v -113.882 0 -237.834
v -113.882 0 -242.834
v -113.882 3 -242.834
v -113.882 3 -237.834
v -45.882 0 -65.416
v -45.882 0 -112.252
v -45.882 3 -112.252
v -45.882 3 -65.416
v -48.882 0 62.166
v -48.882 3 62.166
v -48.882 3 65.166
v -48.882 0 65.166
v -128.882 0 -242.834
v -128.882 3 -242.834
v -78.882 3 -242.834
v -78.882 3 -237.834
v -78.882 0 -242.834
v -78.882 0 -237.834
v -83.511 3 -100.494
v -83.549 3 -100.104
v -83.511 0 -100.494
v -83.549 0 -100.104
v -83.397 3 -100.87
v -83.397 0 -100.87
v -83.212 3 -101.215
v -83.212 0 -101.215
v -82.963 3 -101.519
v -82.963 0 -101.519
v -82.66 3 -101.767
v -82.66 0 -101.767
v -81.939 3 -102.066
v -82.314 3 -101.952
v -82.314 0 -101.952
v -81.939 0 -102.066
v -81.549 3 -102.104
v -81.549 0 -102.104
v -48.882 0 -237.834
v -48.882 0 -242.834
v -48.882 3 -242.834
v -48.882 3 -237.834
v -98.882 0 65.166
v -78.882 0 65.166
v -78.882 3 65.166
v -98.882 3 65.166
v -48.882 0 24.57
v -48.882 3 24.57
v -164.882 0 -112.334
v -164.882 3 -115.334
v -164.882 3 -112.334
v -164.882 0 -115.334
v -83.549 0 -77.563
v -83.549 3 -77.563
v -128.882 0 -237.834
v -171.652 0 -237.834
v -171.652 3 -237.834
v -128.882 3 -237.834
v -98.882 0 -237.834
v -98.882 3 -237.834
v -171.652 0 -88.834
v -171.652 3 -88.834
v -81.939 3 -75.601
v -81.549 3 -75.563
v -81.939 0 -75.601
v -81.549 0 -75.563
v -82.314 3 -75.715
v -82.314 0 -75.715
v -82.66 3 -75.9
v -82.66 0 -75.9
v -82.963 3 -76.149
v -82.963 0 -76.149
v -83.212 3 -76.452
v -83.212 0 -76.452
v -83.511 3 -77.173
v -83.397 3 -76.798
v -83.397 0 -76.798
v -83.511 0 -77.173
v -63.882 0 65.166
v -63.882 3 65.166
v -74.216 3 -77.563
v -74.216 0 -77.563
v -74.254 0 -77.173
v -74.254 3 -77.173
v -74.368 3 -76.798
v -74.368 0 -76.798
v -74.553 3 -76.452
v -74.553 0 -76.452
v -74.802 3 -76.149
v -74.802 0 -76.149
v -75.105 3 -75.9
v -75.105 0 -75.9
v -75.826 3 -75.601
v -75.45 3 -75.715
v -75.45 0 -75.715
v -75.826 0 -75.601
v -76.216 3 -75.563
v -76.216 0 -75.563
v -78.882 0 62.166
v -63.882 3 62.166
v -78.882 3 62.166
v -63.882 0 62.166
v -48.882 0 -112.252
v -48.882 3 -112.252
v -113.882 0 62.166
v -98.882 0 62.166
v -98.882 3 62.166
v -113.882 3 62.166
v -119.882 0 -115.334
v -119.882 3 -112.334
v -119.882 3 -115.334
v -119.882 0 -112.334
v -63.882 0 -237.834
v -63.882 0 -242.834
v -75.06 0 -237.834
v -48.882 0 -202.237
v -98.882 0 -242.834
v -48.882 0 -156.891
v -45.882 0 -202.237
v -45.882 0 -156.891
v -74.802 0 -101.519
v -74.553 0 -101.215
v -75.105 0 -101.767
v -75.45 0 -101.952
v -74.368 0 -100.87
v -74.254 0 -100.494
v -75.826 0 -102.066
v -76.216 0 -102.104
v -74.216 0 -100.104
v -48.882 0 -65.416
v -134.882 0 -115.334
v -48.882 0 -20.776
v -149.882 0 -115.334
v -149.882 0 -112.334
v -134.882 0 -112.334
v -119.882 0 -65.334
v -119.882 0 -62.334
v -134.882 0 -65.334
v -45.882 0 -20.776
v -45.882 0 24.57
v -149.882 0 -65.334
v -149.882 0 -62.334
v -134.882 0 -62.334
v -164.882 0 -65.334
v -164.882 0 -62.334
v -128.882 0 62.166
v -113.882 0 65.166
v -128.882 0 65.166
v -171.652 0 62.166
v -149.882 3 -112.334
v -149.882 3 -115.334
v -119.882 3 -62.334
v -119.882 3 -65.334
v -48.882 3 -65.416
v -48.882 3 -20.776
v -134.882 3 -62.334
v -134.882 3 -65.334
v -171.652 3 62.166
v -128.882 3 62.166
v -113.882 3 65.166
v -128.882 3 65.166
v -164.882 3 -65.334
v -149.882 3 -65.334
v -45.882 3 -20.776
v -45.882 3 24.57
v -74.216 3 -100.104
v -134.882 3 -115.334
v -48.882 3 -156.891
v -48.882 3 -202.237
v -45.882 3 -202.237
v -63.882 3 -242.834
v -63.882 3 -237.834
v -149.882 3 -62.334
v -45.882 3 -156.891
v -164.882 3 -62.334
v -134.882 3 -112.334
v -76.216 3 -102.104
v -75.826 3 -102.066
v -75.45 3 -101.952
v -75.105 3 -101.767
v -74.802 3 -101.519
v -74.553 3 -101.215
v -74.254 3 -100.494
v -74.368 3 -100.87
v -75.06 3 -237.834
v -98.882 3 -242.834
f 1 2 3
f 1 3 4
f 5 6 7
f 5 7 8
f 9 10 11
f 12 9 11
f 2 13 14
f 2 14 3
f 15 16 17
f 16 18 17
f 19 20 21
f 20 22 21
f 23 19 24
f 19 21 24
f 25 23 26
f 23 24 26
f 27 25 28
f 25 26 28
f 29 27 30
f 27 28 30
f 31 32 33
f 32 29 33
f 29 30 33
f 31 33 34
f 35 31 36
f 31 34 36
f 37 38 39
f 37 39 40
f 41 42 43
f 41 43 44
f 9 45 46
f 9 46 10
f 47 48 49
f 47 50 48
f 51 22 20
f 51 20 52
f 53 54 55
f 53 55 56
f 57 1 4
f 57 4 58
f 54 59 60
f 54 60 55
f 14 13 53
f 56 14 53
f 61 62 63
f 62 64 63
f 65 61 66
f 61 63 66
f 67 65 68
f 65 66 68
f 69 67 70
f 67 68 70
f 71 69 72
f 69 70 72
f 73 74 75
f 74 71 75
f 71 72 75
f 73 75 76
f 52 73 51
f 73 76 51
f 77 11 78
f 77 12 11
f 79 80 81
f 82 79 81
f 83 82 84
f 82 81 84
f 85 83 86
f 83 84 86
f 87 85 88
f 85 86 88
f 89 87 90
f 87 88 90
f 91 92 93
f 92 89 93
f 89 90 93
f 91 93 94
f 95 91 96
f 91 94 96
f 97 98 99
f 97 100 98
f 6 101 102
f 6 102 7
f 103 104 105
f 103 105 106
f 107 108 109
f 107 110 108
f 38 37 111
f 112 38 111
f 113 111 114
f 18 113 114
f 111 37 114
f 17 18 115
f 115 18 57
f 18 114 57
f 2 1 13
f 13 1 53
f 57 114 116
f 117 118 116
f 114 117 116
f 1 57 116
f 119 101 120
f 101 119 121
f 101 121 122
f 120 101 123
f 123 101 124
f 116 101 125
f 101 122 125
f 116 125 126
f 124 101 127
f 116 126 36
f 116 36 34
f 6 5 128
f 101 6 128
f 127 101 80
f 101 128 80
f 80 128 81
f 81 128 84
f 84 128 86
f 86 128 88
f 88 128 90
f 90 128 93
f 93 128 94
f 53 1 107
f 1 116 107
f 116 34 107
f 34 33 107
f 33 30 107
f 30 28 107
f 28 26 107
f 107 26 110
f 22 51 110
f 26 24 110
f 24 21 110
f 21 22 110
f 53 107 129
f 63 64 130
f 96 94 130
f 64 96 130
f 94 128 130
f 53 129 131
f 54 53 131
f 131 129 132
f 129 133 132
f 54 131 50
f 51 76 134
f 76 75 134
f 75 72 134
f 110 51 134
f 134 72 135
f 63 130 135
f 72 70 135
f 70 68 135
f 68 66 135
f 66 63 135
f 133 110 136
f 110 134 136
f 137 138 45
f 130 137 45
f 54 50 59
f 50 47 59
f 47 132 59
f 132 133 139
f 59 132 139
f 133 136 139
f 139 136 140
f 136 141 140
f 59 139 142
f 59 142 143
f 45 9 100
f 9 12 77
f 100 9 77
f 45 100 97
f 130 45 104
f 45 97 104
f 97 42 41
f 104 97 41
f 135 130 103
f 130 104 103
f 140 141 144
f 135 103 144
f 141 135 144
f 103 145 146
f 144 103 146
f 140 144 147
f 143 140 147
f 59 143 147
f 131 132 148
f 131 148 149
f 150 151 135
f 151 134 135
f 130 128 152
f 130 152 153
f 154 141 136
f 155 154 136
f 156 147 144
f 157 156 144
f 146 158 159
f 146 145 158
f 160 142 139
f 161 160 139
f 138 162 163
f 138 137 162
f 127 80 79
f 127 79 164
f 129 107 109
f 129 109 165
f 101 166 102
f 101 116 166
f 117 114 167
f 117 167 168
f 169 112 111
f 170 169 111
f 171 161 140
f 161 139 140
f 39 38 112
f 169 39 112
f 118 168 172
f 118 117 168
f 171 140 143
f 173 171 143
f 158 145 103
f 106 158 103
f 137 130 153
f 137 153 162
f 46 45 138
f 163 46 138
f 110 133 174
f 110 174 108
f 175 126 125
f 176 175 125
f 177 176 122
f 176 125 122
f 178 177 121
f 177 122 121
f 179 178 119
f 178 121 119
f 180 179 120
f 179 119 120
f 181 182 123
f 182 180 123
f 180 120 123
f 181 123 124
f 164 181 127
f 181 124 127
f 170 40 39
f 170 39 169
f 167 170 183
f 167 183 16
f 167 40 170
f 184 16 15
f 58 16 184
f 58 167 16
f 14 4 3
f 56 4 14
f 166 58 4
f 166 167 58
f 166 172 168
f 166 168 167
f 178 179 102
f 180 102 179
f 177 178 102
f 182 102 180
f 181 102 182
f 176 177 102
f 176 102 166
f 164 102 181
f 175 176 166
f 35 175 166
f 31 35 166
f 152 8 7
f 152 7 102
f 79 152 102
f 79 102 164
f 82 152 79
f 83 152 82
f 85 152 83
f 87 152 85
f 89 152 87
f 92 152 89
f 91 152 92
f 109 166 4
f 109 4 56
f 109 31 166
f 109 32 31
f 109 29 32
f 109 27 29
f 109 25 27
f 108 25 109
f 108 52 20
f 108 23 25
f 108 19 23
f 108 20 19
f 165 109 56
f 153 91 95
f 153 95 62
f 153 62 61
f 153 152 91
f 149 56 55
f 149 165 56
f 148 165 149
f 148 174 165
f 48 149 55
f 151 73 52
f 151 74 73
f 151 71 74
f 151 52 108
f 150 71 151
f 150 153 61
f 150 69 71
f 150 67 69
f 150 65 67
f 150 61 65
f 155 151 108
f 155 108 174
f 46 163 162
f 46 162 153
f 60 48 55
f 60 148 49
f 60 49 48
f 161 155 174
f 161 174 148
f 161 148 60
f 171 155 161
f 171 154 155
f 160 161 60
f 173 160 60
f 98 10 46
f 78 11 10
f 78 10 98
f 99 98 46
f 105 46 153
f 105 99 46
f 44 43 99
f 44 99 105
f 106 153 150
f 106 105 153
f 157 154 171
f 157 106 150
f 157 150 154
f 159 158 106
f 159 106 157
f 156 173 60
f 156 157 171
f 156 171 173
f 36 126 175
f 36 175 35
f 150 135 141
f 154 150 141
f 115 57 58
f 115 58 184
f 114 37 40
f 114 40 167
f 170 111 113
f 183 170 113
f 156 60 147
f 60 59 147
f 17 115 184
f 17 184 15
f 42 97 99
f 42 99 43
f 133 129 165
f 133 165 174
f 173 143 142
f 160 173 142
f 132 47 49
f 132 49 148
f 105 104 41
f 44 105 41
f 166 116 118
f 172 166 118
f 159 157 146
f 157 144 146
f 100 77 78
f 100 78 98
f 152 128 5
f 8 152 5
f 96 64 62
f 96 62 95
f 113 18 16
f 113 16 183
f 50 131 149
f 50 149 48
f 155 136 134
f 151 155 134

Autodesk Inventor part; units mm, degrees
ref_plane "YZ Plane" through (0, 0, 0) normal (1, 0, 0) x (0, 1, 0)
ref_plane "XZ Plane" through (0, 0, 0) normal (0, 1, 0) x (-1, 0, 0)
ref_plane "XY Plane" through (0, 0, 0) normal (0, 0, 1) x (1, 0, 0)
sketch "Sketch1" plane through (0, 0, 0) normal (0, 1, 0) x (-1, 0, 0)
  line L0 (98.8824, -242.8336) -> (78.8824, -242.8336)
  line L1 (98.8824, -237.8336) -> (98.8824, -242.8336)
  line L2 (113.8824, -237.8336) -> (98.8824, -237.8336)
  line L3 (128.8824, -242.8336) -> (113.8824, -242.8336)
  line L4 (128.8824, -242.8336) -> (128.8824, -237.8336)
  line L5 (113.8824, -242.8336) -> (113.8824, -237.8336)
  line L6 (113.8824, 65.1664) -> (113.8824, 62.1664)
  line L7 (98.8824, 62.1664) -> (98.8824, 65.1664)
  line L8 (78.8824, 65.1664) -> (98.8824, 65.1664)
  line L9 (98.8824, 62.1664) -> (113.8824, 62.1664)
  line L10 (113.8824, 65.1664) -> (128.8824, 65.1664)
  line L11 (128.8824, 62.1664) -> (128.8824, 65.1664)
  line L12 (78.8824, 62.1664) -> (78.8824, 65.1664)
  line L13 (63.8824, 62.1664) -> (78.8824, 62.1664)
  line L14 (63.8824, 65.1664) -> (63.8824, 62.1664)
  line L15 (63.8824, -242.8336) -> (63.8824, -237.8336)
  line L16 (63.8824, -237.8336) -> (75.0605, -237.8336)
  line L17 (78.8824, -237.8336) -> (78.8824, -242.8336)
  line L18 (78.8824, -237.8336) -> (63.8824, -237.8336)
  line L19 (63.8824, -237.8336) -> (78.8824, -237.8336)
  line L20 (48.8824, -65.4156) -> (48.8824, -20.7764)
  line L21 (48.8824, -65.4156) -> (48.8824, -20.7764)
  line L22 (48.8824, -65.4156) -> (45.8824, -65.4156)
  line L23 (45.8824, -112.2516) -> (45.8824, -65.4156)
  line L24 (48.8824, -20.7764) -> (45.8824, -20.7764)
  line L25 (48.8824, -202.2369) -> (45.8824, -202.2369)
  line L26 (48.8824, -156.8908) -> (45.8824, -156.8908)
  line L27 (45.8824, -202.2369) -> (45.8824, -156.8908)
  line L28 (48.8824, -112.2516) -> (45.8824, -112.2516)
  line L29 (48.8824, -156.8908) -> (48.8824, -112.2516)
  line L30 (48.8824, -156.8908) -> (48.8824, -112.2516)
  line L31 (45.8824, -20.7764) -> (45.8824, 24.5697)
  line L32 (48.8824, 24.5697) -> (45.8824, 24.5697)
  line L33 (48.8824, 24.5697) -> (48.8824, 62.1664)
  line L34 (48.8824, 65.1664) -> (63.8824, 65.1664)
  line L35 (48.8824, 24.5697) -> (48.8824, 65.1664)
  line L36 (48.8824, -237.8336) -> (48.8824, -202.2369)
  line L37 (48.8824, -242.8336) -> (63.8824, -242.8336)
  line L38 (48.8824, -242.8336) -> (48.8824, -237.8336)
  line L39 (164.8824, -115.3336) -> (164.8824, -112.3336)
  line L40 (164.8824, -112.3336) -> (149.8824, -112.3336)
  line L41 (149.8824, -112.3336) -> (149.8824, -115.3336)
  line L42 (134.8824, -115.3336) -> (134.8824, -112.3336)
  line L43 (134.8824, -112.3336) -> (119.8824, -112.3336)
  line L44 (119.8824, -112.3336) -> (119.8824, -115.3336)
  line L45 (119.8824, -115.3336) -> (134.8824, -115.3336)
  line L46 (149.8824, -115.3336) -> (164.8824, -115.3336)
  line L47 (171.6524, -88.8336) -> (171.6524, -237.8336)
  line L48 (171.6524, -237.8336) -> (128.8824, -237.8336)
  line L49 (171.6524, -88.8336) -> (171.6524, 62.1664)
  line L50 (171.6524, 62.1664) -> (128.8824, 62.1664)
  line L51 (164.8824, -62.3336) -> (164.8824, -65.3336)
  line L52 (164.8824, -65.3336) -> (149.8824, -65.3336)
  line L53 (149.8824, -65.3336) -> (149.8824, -62.3336)
  line L54 (134.8824, -62.3336) -> (134.8824, -65.3336)
  line L55 (134.8824, -65.3336) -> (119.8824, -65.3336)
  line L56 (119.8824, -65.3336) -> (119.8824, -62.3336)
  line L57 (119.8824, -62.3336) -> (134.8824, -62.3336)
  line L58 (149.8824, -62.3336) -> (164.8824, -62.3336)
  line L59 (76.2158, -102.1043) -> (81.5491, -102.1043)
  line L60 (83.5491, -100.1043) -> (83.5491, -77.5629)
  line L61 (81.5491, -75.5629) -> (76.2158, -75.5629)
  line L62 (74.2158, -77.5629) -> (74.2158, -100.1043)
  line L63 (74.2158, -102.1043) -> (83.5491, -75.5629) construction
  line L64 (83.5491, -102.1043) -> (74.2158, -75.5629) construction
  arc A0 (83.5491, -77.5629) -> (81.5491, -75.5629) centre (81.5491, -77.5629) ccw
  arc A1 (76.2158, -75.5629) -> (74.2158, -77.5629) centre (76.2158, -77.5629) ccw
  arc A2 (81.5491, -102.1043) -> (83.5491, -100.1043) centre (81.5491, -100.1043) ccw
  arc A3 (74.2158, -100.1043) -> (76.2158, -102.1043) centre (76.2158, -100.1043) ccw
  point P0 (0, 0)
  point P1 (0, 0)
  point P2 (106.3824, -237.8336)
  point P3 (106.3824, 62.1664)
  point P4 (121.3824, 65.1664)
  point P5 (47.3824, -202.2369)
  point P6 (78.8824, -88.8336)
  dimension "d0" = 80
  dimension "d1" = 15
  dimension "d2" = 15
  dimension "d3" = 300
  dimension "d5" = 3
  dimension "d6" = 5
  dimension "d7" = 44.6392
  dimension "d8" = 37.5967
  dimension "d9" = 44.6392
  dimension "d10" = 40.5967
  dimension "d11" = 45.3461
  dimension "d12" = 46.8359
  dimension "d13" = 45.3461
  dimension "d14" = 20
  dimension "d15" = 15
  dimension "d16" = 15
  dimension "d17" = 15
  dimension "d18" = 15
  dimension "d19" = 15
  dimension "d20" = 15
  dimension "d21" = 20
  dimension "d22" = 308
  dimension "d29" = 3
  dimension "d30" = 15
  dimension "d31" = 3
  dimension "d32" = 15
  dimension "d33" = 3
  dimension "d34" = 15
  dimension "d38" = 2
extrude "Extrusion1" add sketch "Sketch1" along normal blind 3
properties part number "mieng_ben_gan_sensor_3mm"
